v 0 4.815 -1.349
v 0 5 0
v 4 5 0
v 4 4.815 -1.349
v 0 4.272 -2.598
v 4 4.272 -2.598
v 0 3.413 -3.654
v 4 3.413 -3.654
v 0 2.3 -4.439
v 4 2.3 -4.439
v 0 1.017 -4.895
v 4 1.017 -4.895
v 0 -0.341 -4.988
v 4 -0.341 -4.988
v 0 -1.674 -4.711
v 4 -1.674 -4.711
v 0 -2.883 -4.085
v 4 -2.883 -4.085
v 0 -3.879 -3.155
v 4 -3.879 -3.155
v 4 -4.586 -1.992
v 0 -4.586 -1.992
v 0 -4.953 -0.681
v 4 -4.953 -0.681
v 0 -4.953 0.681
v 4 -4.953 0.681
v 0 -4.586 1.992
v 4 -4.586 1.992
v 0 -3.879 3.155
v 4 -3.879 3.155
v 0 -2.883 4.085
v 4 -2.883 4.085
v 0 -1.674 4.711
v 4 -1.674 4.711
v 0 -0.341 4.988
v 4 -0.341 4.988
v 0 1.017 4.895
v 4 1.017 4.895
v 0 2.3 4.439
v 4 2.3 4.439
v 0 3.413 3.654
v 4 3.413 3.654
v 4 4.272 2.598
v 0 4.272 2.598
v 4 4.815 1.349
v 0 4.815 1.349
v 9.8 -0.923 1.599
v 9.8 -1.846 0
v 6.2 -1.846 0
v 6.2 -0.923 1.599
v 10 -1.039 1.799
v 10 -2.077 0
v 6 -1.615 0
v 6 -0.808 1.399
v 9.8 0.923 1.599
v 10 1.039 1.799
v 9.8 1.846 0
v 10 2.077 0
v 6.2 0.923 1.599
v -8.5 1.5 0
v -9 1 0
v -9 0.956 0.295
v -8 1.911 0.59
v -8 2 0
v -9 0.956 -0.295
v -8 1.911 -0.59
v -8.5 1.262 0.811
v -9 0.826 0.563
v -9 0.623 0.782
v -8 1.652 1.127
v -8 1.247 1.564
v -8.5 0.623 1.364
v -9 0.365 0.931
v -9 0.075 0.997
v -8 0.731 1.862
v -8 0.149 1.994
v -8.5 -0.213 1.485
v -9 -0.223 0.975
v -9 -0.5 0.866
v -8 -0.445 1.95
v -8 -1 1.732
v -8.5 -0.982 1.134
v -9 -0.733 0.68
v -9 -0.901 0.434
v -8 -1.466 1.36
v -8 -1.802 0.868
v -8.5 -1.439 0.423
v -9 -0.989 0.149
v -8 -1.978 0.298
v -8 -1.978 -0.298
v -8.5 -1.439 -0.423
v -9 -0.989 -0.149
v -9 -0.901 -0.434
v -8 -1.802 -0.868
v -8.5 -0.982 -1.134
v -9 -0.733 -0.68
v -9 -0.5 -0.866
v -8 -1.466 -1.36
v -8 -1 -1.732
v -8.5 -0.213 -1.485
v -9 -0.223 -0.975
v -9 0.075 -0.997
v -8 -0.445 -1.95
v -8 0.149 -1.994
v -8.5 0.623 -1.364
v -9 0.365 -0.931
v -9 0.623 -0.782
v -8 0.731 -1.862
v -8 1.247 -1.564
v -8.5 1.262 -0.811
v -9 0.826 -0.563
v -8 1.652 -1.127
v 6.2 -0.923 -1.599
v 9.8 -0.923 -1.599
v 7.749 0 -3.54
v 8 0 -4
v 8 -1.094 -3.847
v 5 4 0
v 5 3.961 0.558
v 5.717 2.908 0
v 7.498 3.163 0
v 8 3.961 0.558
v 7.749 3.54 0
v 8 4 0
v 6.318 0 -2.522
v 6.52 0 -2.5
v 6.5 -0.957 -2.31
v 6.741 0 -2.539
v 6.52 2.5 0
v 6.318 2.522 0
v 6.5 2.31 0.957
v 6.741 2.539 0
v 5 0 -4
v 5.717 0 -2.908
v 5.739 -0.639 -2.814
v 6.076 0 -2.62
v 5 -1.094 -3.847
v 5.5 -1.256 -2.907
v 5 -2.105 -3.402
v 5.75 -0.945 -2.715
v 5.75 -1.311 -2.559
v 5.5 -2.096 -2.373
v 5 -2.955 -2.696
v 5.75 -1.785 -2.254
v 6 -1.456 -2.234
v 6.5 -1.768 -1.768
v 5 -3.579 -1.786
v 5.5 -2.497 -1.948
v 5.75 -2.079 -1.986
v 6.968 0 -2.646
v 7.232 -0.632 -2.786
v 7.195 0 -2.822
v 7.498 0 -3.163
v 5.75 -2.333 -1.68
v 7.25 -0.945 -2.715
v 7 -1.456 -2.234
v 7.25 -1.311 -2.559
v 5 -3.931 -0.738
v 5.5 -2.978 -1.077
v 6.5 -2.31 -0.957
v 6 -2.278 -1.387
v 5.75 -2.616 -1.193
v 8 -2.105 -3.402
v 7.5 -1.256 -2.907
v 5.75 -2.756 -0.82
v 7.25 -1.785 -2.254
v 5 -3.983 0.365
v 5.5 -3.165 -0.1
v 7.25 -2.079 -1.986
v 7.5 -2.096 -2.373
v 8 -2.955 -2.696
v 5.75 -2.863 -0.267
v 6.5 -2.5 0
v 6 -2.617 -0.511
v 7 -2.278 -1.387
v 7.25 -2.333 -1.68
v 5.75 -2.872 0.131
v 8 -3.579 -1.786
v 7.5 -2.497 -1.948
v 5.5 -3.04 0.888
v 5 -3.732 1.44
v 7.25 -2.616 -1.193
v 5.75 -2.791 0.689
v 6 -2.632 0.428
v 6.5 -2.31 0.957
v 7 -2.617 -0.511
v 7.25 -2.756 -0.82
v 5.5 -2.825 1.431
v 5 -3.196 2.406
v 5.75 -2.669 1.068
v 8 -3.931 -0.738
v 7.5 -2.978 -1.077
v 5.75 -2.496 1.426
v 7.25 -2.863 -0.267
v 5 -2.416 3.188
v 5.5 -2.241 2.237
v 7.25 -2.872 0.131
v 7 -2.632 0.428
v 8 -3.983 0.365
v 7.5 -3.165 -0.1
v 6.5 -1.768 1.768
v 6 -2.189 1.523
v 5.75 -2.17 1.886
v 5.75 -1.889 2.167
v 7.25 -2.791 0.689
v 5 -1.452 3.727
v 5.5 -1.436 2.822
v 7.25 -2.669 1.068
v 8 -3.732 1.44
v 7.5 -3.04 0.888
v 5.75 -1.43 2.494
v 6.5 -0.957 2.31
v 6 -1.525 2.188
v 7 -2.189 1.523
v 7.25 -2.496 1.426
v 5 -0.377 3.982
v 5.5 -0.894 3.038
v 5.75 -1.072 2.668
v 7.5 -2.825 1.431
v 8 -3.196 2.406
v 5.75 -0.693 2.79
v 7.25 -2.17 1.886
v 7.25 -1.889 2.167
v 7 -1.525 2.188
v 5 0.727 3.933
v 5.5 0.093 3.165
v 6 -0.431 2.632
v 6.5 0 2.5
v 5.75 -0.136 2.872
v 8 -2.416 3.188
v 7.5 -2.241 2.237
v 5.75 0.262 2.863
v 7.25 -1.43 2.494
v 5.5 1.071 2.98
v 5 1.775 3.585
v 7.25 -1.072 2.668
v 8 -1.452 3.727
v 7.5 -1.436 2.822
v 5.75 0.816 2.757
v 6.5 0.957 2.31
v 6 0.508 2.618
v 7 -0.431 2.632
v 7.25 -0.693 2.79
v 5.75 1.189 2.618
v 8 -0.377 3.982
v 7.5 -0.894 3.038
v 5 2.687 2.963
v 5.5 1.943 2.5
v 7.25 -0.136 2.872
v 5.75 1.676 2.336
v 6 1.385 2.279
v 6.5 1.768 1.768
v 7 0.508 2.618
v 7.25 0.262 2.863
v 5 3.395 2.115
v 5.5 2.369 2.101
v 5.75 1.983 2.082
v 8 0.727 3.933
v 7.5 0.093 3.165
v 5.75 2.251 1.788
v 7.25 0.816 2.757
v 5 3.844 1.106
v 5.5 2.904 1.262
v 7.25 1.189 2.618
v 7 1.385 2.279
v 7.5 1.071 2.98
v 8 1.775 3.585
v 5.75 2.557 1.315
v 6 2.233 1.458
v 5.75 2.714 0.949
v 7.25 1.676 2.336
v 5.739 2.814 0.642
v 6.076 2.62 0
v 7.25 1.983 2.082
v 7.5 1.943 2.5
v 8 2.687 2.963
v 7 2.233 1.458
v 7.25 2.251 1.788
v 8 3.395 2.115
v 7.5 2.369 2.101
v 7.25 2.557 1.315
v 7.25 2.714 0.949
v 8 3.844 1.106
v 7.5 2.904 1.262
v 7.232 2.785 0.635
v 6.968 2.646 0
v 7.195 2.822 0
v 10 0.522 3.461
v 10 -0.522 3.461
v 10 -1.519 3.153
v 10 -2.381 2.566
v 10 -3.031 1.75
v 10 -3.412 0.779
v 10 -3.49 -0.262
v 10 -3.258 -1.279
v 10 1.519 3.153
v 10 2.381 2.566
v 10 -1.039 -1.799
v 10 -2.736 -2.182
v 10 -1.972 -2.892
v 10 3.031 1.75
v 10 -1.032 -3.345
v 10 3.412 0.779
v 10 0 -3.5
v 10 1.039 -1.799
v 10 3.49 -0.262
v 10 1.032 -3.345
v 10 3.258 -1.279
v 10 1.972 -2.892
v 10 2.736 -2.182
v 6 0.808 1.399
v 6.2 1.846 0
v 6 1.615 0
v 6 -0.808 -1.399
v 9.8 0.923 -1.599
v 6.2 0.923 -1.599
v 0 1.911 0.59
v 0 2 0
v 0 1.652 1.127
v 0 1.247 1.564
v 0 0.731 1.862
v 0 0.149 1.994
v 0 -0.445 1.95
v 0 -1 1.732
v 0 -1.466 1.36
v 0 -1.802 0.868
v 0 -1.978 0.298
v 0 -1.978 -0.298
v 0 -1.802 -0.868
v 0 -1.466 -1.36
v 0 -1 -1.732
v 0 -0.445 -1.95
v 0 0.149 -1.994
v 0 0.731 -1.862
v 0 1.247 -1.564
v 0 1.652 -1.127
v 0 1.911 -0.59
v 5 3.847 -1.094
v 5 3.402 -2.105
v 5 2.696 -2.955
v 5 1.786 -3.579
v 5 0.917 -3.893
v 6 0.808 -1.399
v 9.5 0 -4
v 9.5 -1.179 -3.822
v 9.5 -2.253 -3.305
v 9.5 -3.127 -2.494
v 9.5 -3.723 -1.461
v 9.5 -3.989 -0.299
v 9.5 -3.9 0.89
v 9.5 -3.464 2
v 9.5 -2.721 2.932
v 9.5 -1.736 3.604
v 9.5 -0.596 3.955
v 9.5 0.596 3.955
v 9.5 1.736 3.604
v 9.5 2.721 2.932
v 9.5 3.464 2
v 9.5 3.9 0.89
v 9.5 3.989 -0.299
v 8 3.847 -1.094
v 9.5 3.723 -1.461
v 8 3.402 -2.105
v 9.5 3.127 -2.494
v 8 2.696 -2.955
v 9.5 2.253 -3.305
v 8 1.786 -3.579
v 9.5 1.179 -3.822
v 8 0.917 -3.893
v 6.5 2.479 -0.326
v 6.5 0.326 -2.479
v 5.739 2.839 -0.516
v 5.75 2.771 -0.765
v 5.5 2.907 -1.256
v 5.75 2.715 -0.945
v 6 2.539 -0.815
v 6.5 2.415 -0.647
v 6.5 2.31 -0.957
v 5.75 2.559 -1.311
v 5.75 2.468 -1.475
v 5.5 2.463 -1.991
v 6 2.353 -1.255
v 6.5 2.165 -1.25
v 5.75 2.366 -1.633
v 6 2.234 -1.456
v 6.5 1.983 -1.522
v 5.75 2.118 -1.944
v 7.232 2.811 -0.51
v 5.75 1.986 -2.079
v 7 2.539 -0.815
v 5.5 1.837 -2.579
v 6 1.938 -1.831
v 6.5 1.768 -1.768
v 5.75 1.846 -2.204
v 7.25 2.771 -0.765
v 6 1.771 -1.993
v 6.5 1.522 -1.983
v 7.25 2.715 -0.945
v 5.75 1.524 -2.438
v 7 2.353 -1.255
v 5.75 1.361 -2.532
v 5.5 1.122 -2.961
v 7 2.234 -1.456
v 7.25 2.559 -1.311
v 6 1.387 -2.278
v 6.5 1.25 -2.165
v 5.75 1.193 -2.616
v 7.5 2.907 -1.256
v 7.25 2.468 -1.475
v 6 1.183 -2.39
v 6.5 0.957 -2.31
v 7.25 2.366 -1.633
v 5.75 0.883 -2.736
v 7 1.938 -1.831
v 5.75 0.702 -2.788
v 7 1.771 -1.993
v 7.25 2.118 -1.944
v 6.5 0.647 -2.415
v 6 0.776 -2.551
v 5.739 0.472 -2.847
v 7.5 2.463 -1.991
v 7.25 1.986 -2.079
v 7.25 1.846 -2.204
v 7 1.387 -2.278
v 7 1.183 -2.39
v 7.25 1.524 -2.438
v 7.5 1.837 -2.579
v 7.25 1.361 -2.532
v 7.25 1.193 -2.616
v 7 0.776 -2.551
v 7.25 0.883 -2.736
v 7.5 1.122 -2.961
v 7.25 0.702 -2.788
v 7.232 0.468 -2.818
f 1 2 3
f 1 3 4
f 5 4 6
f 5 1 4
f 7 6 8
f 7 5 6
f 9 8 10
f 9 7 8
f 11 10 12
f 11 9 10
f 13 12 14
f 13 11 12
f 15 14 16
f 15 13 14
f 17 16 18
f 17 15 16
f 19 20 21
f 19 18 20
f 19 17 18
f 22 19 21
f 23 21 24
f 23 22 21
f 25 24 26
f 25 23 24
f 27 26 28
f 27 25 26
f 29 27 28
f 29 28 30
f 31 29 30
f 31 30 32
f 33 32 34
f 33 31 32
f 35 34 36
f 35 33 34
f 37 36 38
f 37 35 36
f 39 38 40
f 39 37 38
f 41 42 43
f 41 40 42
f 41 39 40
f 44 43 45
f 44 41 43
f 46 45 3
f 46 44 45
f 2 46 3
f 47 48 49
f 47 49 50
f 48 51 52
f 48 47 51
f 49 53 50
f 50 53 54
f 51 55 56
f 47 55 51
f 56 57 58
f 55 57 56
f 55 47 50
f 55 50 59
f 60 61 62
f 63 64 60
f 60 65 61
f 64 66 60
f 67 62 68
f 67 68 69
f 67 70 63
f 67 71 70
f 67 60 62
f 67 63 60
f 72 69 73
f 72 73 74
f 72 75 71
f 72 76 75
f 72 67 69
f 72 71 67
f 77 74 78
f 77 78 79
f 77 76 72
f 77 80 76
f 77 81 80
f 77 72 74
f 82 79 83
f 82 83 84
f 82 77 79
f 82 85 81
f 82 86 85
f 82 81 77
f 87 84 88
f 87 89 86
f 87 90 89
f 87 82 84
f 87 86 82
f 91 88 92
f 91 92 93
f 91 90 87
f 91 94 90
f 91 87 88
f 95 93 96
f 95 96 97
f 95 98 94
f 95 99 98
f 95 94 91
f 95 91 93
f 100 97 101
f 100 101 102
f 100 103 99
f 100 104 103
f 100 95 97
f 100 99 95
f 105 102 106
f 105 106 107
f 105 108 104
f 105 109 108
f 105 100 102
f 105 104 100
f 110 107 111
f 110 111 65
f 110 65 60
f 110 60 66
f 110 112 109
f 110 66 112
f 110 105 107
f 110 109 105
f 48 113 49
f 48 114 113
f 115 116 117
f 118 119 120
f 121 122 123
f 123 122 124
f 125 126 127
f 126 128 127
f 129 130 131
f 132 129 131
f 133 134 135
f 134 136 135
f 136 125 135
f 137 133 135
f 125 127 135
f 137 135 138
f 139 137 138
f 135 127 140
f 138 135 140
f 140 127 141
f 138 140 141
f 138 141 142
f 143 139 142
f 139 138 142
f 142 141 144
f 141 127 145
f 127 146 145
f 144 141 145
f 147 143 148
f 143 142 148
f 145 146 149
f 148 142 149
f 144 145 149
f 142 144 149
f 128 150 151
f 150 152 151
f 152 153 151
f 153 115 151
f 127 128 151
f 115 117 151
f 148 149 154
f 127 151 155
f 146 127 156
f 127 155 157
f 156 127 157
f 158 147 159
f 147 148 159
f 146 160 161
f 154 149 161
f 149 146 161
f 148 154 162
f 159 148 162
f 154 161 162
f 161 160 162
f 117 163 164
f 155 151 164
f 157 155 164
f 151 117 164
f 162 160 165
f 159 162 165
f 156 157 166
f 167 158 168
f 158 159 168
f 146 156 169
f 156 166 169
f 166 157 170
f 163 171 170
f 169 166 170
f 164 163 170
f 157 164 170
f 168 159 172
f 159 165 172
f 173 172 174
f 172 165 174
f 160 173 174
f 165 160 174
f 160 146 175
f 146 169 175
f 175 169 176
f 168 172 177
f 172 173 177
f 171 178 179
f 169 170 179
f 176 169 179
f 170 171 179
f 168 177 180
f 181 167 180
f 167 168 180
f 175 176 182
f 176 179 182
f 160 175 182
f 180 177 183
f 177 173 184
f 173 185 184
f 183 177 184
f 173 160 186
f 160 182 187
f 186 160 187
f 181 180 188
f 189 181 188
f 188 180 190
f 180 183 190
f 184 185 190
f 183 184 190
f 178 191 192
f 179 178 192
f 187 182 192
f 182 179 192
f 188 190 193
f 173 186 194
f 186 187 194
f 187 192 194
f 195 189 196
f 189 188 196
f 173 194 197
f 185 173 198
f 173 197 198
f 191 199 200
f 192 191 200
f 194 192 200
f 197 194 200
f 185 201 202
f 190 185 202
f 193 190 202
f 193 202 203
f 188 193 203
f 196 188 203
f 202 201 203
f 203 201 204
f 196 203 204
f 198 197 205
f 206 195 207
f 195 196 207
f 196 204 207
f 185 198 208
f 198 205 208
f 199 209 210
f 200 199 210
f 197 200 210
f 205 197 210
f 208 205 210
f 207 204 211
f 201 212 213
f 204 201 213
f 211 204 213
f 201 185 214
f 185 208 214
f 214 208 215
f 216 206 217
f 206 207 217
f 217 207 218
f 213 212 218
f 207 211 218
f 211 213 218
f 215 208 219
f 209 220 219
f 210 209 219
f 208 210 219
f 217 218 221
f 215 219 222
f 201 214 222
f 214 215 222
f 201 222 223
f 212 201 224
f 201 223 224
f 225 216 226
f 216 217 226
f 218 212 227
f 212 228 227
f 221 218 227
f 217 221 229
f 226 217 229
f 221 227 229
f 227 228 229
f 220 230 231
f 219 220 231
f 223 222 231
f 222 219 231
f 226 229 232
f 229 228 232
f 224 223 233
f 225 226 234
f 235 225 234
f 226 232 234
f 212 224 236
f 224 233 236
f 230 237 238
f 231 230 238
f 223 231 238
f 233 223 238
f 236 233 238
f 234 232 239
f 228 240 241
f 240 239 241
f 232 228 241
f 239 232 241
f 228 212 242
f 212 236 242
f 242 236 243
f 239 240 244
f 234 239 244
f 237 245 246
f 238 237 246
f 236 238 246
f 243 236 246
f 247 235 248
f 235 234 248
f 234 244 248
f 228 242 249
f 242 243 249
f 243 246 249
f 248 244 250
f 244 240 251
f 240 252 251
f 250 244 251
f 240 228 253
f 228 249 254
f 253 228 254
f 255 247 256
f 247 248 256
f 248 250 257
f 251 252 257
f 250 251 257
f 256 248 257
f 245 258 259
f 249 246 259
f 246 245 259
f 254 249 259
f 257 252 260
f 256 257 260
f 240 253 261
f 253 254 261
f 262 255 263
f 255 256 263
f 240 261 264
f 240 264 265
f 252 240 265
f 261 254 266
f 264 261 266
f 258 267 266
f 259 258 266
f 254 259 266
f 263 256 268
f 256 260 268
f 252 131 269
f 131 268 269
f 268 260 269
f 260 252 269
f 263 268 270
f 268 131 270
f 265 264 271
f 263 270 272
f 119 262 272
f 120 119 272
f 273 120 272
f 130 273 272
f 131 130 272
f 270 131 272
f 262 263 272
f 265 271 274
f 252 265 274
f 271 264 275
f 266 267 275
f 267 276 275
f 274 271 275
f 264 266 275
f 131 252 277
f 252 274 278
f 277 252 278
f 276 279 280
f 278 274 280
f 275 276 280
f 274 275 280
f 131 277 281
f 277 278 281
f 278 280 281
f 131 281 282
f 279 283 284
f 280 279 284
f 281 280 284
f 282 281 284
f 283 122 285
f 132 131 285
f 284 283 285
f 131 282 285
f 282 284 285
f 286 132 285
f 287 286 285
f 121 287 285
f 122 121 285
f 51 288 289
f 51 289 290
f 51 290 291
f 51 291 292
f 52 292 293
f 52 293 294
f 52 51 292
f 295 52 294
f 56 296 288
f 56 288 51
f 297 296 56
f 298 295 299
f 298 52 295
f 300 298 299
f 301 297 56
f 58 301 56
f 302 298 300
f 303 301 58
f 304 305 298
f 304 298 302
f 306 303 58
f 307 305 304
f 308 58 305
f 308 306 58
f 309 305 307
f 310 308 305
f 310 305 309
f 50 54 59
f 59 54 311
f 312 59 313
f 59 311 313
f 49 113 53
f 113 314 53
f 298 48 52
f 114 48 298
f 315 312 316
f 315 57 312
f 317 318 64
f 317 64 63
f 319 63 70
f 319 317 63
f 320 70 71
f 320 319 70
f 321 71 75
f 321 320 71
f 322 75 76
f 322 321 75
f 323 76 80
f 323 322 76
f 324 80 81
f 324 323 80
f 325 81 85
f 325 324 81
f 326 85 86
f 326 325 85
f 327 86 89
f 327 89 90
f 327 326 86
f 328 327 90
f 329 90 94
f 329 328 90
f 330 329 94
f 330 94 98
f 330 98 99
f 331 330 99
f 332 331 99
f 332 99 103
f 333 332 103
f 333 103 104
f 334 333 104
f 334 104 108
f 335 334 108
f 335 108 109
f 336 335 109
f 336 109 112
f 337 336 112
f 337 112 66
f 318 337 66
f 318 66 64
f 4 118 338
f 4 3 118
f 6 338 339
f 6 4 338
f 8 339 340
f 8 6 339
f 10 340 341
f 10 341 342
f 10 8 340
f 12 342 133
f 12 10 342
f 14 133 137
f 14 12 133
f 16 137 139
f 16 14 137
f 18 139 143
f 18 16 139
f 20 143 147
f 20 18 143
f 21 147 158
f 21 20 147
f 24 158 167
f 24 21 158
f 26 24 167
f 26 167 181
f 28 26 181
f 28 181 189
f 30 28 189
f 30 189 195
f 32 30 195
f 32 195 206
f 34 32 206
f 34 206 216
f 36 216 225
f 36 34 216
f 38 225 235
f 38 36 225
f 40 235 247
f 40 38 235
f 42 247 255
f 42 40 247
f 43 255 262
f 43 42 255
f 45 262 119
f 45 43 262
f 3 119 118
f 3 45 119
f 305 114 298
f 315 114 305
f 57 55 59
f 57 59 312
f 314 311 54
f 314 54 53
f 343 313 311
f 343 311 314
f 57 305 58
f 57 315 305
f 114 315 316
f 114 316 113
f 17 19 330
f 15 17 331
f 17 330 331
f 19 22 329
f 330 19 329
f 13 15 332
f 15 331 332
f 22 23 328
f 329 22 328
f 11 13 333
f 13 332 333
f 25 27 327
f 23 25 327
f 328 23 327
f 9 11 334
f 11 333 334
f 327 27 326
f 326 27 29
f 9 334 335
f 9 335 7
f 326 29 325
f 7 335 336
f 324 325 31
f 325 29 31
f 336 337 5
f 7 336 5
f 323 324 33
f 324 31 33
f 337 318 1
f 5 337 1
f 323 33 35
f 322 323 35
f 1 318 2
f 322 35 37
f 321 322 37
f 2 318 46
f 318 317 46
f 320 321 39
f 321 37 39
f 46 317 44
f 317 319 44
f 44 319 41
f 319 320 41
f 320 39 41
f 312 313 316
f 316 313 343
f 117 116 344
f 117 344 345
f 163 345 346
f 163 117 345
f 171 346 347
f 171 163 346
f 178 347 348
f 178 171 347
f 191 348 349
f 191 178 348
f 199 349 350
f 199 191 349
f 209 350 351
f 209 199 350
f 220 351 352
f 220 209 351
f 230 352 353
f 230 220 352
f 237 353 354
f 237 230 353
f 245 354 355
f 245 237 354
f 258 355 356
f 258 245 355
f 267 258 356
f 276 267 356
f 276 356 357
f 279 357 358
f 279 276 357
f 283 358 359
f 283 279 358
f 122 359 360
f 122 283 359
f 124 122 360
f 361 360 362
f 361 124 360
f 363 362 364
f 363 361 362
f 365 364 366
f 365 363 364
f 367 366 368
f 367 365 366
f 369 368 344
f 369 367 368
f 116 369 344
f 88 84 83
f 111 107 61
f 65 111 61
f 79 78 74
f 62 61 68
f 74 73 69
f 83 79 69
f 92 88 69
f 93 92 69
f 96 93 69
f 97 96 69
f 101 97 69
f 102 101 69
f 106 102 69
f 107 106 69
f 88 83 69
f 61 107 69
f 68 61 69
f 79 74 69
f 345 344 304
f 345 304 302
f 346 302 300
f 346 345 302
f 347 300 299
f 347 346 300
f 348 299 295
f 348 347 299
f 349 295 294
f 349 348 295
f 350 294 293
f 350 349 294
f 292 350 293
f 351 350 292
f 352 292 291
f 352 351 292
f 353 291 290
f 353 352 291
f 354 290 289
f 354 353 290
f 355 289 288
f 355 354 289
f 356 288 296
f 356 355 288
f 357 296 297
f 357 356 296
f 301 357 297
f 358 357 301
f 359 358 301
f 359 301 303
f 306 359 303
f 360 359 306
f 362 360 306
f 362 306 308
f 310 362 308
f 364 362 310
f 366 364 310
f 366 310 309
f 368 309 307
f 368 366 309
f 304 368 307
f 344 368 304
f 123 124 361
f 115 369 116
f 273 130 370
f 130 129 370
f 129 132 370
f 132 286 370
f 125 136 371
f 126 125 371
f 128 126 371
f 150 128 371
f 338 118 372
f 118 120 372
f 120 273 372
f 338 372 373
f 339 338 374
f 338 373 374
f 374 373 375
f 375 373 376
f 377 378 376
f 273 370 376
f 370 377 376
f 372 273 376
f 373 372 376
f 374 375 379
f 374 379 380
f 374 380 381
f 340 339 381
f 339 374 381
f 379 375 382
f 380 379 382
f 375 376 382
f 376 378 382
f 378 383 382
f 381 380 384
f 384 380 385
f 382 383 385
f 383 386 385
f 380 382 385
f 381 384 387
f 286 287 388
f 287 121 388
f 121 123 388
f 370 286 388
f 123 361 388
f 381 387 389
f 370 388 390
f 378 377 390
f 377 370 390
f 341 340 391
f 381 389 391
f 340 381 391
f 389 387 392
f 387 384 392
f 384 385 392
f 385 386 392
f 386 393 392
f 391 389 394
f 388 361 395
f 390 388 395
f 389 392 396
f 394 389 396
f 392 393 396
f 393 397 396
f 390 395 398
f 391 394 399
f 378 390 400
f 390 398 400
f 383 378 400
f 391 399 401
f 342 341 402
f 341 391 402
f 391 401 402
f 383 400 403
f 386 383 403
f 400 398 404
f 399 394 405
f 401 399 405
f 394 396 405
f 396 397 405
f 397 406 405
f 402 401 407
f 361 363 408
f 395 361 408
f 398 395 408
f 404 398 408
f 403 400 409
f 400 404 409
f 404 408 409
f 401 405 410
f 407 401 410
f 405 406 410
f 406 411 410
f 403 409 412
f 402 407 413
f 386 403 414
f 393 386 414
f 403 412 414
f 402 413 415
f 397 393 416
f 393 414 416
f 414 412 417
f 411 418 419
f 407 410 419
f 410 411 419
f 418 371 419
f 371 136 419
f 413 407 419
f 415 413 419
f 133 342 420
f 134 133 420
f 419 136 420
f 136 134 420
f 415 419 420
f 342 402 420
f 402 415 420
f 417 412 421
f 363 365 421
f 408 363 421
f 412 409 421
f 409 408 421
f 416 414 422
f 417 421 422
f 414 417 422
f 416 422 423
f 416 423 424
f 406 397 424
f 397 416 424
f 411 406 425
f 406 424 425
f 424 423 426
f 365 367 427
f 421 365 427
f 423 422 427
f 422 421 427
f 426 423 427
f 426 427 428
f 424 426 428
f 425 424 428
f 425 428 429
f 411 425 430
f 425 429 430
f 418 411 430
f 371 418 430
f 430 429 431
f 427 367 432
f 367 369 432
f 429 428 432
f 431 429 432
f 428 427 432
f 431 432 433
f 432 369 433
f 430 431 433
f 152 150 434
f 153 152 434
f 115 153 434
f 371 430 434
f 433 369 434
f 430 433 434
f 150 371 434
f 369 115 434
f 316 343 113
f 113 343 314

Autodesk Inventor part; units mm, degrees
ref_plane "YZ Plane" through (0, 0, 0) normal (1, 0, 0) x (0, 1, 0)
ref_plane "XZ Plane" through (0, 0, 0) normal (0, 1, 0) x (-1, 0, 0)
sketch "草图1" plane through (0, 0, 0) normal (1, 0, 0) x (0, 1, 0)
  circle A0 centre (0, 0) radius 2
  circle A1 centre (0, 0) radius 5
  dimension "d0" = 4
  dimension "d1" = 10
extrude "拉伸1" add sketch "草图1" along normal blind 5 contours A0 | A1
extrude "拉伸2" add sketch "草图1" against normal blind 9 contours A0
chamfer "倒角1" distance 1 angle 45 1 edges at (-9, -2, 0)
thread "螺纹1" size "M4x0.7" class "6g" standard "ANSI Metric M Profile" length 9
ref_plane "工作平面2" through (8, 0, 0) normal (1, 0, 0) x (0, 0, -1)
ref_plane "工作平面1" through (6.5, 0, 0) normal (1, 0, 0) x (0, 0, -1)
sketch "草图3" plane through (8, 0, 0) normal (1, 0, 0) x (0, 0, -1)
  circle A0 centre (0, 0) radius 4
  dimension "d14" = 8
extrude "拉伸3" add sketch "草图3" along normal blind 2
chamfer "倒角3" distance 1 angle 45 1 edges at (5, -5, 0)
sketch "草图4" plane through (6.5, 0, 0) normal (1, 0, 0) x (0, 0, -1)
  circle A0 centre (0, 0) radius 2.5
  dimension "d29" = 5
loft "放样2" add profiles "草图4" section 1 edges at (5, -4, 0) section 3 edges at (8, 0, 4)
chamfer "倒角4" distance 0.5 angle 45 1 edges at (10, 0, 4)
sketch "草图6" plane through (10, 0, 0) normal (1, 0, 0) x (0, 0, -1)
  circle A0 centre (0, 0) radius 1.6
  line L0 (1.599, -0.9232) -> (0, -1.8464)
  line L1 (0, -1.8464) -> (-1.599, -0.9232)
  line L2 (-1.599, -0.9232) -> (-1.599, 0.9232)
  line L3 (-1.599, 0.9232) -> (0, 1.8464)
  line L4 (0, 1.8464) -> (1.599, 0.9232)
  line L5 (1.599, 0.9232) -> (1.599, -0.9232)
  dimension "d46" = 3.2
extrude "拉伸5" cut sketch "草图6" against normal blind 4
chamfer "倒角6" distance 0.2 angle 45 6 edges at (10, 1.3848, -0.7995) (10, 1.3848, 0.7995) (10, 0, 1.599) (10, -1.3848, 0.7995) (10, -1.3848, -0.7995) (10, 0, -1.599)
chamfer "倒角7" distance 0.2 angle 45 6 edges at (6, 1.3848, 0.7995) (6, 1.3848, -0.7995) (6, 0, 1.599) (6, -1.3848, 0.7995) (6, -1.3848, -0.7995) (6, 0, -1.599)
properties part number "knob" material "铝 6061-AHC"
